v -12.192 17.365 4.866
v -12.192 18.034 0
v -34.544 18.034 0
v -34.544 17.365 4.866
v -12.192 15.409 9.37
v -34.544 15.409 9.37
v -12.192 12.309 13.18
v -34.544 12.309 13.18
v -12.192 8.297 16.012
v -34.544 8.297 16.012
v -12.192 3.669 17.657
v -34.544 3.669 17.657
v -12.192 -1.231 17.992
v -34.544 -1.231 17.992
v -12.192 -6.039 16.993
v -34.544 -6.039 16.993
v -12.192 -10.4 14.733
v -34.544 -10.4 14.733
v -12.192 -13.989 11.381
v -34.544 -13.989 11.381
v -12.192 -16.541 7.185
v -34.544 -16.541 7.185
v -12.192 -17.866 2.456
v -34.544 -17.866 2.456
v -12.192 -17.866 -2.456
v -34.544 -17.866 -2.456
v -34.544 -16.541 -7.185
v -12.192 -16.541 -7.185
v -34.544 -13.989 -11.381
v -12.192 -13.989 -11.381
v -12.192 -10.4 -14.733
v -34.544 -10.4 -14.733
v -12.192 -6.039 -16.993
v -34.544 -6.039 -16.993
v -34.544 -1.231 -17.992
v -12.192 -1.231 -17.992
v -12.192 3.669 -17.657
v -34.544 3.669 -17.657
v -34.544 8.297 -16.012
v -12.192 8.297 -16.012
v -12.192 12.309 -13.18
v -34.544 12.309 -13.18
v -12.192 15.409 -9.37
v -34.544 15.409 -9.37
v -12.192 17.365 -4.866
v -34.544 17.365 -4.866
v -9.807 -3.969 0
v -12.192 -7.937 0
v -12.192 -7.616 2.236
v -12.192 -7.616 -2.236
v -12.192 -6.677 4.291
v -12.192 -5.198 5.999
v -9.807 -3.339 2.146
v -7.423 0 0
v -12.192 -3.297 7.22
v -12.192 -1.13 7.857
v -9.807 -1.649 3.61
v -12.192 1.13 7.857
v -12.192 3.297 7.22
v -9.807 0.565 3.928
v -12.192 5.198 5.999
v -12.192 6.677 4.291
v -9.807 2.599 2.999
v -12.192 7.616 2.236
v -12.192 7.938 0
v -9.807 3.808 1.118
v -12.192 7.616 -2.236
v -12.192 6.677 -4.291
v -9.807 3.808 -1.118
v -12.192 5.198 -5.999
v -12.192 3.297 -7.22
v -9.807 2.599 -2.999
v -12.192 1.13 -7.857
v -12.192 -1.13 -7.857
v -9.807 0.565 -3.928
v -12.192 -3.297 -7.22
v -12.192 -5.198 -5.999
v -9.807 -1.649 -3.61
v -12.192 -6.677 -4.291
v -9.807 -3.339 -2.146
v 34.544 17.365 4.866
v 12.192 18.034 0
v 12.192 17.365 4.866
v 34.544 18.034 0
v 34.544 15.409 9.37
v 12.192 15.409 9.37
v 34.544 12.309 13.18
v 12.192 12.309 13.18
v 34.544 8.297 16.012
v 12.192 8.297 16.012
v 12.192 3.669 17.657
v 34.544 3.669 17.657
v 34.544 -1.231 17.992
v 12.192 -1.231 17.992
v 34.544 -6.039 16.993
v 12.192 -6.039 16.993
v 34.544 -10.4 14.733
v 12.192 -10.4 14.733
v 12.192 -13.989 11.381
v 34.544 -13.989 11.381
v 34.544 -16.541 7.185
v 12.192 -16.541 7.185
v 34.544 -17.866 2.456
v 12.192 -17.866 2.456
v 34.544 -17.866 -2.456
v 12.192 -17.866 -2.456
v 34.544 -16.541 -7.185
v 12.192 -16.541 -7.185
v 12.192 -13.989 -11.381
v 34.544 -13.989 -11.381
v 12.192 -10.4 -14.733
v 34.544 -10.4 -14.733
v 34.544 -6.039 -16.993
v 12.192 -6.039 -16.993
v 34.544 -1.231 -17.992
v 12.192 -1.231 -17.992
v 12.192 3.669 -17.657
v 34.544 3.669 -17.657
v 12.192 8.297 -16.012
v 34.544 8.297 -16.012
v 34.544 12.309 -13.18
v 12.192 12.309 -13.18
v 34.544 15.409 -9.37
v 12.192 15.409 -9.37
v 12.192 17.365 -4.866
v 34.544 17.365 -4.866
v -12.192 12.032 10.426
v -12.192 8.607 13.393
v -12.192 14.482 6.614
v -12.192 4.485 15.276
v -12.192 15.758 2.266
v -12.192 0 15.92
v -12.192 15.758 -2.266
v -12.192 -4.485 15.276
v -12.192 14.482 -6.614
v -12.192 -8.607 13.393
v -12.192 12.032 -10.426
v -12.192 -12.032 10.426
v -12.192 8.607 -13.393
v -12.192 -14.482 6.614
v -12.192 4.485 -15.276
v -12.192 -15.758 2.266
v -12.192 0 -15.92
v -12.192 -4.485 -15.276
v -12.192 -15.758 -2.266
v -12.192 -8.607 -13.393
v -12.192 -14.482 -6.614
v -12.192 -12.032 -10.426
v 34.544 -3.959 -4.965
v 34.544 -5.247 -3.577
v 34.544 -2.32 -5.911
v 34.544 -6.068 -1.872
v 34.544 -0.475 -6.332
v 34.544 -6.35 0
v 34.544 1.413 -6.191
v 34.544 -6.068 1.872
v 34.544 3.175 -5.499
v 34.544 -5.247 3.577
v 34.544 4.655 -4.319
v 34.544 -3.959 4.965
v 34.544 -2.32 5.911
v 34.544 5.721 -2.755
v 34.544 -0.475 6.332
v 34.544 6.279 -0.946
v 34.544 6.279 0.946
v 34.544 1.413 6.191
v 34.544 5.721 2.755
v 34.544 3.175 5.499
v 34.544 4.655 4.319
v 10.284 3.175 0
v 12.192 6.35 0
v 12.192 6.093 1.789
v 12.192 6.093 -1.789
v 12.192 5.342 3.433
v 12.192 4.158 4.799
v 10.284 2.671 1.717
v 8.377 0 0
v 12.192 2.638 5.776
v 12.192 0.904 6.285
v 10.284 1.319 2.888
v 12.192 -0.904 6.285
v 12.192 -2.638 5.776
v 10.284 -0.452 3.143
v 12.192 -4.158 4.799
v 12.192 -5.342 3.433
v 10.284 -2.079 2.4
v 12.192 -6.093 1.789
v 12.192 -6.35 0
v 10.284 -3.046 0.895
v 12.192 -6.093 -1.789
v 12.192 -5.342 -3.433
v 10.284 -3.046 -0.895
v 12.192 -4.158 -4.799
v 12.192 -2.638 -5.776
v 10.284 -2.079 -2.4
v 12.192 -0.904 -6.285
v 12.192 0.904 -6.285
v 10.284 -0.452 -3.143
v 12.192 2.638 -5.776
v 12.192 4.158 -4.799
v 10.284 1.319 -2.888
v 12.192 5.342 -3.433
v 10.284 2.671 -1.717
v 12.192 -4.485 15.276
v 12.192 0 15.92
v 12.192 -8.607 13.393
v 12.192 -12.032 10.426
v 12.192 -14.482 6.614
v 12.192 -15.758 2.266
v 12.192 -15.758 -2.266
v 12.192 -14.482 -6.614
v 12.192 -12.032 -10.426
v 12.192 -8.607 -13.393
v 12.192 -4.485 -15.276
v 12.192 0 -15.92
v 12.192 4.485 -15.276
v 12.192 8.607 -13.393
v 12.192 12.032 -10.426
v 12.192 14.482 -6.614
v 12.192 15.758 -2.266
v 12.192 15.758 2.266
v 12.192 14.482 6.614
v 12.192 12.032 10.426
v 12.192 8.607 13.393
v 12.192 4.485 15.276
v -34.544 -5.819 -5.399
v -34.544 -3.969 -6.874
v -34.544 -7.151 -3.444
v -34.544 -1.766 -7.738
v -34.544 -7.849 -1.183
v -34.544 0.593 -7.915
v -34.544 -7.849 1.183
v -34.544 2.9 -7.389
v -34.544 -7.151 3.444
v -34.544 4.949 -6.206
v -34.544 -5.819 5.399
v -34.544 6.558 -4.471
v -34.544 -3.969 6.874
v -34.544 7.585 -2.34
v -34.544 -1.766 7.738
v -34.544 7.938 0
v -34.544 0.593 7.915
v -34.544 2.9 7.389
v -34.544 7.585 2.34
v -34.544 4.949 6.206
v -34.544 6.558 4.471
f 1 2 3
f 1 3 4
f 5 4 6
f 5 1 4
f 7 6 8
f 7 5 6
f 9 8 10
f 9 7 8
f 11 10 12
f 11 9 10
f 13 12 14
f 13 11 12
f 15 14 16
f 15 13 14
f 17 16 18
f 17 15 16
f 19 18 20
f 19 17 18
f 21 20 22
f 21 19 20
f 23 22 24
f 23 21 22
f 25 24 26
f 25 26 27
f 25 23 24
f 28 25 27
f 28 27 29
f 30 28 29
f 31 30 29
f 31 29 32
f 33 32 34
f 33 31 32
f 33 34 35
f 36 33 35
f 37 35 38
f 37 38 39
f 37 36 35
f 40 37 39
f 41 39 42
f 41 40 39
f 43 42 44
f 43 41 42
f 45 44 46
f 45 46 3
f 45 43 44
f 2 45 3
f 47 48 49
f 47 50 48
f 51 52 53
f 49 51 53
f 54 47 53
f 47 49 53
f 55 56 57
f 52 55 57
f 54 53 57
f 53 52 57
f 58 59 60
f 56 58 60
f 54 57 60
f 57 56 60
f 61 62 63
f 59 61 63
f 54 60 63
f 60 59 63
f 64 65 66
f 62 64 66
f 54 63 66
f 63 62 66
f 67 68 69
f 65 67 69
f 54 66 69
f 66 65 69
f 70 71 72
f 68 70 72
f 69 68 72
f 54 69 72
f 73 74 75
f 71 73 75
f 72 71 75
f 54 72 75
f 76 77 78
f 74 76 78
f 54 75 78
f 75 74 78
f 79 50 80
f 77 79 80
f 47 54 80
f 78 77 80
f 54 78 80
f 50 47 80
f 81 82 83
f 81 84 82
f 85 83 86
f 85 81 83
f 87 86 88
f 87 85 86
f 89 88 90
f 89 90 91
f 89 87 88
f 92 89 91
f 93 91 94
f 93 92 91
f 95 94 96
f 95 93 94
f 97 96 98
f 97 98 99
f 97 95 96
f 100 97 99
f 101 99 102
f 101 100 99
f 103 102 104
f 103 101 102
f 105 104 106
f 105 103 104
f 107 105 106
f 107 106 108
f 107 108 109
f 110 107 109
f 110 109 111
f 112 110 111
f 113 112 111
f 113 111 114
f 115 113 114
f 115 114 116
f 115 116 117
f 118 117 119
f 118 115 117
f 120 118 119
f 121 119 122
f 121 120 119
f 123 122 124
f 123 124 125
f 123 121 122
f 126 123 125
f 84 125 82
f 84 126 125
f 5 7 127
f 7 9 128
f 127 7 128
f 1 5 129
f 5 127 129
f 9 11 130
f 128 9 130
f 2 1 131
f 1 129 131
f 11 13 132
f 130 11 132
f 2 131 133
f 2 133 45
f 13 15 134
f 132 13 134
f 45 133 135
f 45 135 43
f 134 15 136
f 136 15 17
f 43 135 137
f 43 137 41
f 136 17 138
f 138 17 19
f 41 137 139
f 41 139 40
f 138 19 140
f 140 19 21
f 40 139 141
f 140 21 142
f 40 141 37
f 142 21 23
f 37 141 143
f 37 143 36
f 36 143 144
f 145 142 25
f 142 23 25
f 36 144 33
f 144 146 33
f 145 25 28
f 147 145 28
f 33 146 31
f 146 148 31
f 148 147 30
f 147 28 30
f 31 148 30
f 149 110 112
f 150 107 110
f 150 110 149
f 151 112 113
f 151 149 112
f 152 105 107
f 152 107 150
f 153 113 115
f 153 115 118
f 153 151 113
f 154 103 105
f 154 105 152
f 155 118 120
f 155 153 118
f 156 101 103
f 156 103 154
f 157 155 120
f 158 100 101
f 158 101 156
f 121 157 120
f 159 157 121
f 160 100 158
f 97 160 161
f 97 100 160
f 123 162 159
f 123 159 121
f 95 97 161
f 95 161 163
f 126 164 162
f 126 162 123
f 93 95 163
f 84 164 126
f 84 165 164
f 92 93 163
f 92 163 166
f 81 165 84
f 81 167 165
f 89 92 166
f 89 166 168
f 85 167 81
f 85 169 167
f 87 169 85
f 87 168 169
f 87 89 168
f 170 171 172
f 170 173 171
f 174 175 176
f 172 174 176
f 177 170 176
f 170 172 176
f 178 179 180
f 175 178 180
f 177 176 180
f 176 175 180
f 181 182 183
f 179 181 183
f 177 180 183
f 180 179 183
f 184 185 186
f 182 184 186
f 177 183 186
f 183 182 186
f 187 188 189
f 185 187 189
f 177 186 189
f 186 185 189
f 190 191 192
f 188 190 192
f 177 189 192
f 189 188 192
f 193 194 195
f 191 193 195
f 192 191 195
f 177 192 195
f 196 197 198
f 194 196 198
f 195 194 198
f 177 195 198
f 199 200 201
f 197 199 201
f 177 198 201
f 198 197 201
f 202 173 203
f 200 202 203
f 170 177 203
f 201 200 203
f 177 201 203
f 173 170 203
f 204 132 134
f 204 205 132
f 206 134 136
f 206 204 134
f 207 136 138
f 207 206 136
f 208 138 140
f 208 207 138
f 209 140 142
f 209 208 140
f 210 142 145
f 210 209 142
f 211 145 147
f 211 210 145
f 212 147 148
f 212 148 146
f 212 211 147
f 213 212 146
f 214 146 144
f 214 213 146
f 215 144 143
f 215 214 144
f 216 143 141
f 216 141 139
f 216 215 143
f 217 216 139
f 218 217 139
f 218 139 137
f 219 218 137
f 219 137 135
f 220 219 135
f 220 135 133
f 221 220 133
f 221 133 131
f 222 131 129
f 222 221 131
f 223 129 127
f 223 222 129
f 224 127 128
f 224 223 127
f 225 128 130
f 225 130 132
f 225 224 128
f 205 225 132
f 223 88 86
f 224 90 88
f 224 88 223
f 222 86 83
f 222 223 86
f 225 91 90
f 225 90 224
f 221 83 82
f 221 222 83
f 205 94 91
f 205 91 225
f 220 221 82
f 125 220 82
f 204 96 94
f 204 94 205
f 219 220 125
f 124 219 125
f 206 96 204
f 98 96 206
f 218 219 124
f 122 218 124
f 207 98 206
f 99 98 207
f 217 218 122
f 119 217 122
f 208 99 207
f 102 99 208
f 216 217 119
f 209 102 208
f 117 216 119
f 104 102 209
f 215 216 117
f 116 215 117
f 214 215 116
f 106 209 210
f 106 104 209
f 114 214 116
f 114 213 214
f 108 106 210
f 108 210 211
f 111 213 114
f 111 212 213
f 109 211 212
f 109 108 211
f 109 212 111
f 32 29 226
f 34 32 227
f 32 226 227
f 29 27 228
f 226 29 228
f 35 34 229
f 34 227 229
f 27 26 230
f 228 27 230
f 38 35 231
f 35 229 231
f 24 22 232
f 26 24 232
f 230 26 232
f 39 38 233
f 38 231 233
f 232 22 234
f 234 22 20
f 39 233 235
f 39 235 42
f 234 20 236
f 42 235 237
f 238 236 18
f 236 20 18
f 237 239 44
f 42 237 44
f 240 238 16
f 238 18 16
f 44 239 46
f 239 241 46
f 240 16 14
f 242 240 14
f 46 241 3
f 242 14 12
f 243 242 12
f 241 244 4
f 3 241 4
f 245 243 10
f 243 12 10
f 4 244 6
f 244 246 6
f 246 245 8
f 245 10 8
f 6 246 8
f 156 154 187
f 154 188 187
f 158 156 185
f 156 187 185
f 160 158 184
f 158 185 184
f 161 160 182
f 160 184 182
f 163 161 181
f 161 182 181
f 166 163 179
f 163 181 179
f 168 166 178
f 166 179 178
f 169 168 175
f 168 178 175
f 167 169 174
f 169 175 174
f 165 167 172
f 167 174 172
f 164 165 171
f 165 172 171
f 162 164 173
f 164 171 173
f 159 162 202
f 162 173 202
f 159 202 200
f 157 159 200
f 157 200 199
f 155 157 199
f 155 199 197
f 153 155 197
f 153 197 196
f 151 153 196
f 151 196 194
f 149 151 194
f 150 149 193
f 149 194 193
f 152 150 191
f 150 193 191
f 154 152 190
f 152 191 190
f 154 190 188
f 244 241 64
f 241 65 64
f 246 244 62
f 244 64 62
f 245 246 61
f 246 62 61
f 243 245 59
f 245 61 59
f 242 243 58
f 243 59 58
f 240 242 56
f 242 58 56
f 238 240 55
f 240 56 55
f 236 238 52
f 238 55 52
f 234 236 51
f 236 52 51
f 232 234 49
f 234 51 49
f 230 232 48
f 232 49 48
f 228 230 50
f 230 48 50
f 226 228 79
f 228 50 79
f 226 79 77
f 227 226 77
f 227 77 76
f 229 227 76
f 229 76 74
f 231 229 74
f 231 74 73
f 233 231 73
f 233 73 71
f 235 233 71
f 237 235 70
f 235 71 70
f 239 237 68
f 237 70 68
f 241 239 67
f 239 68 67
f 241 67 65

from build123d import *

# Parameters (mm, degrees)
F0_R     = 18.034
F1_DEPTH = 34.544
F2_W     = 24.384
F2_H     = 2.286
F5_D     = 12.7
F5_DEPTH = 22.352
F5_TIP   = 3.8154649308
F7_D     = 15.875
F7_DEPTH = 22.352
F7_TIP   = 4.7693311635


# Not quite as in the source:
# - a length typed as a fraction of an inch, garbled in the dataset ("3 / 203.2 mm" for 3/8 in), is restored


with BuildPart() as f1:
    # F0 (on Right) → F1 (new body, symmetric)
    with BuildSketch(Plane.YZ):
        Circle(F0_R)
    extrude(amount=F1_DEPTH, both=True)

    # F2 (on Front) → F3 (revolve, cut)
    with BuildSketch(Plane.XZ):
        with Locations((0, 17.0634527736)):
            Rectangle(F2_W, F2_H)
    revolve(axis=Axis((6.0458816588, 0, 0), (1, 0, 0)), mode=Mode.SUBTRACT)

    # F5
    with Locations(Plane.YZ.offset(34.544)):
        with Locations((0, 0)):
            Hole(F5_D / 2, depth=F5_DEPTH)
            with Locations((0, 0, -(F5_DEPTH + F5_TIP / 2))):  # 118° drill point
                Cone(0, F5_D / 2, F5_TIP, mode=Mode.SUBTRACT)

    # F7
    with Locations(Plane(origin=(-34.544, 0, 0), x_dir=(0, -1, 0), z_dir=(-1, 0, 0))):
        with Locations((0, 0)):
            Hole(F7_D / 2, depth=F7_DEPTH)
            with Locations((0, 0, -(F7_DEPTH + F7_TIP / 2))):  # 118° drill point
                Cone(0, F7_D / 2, F7_TIP, mode=Mode.SUBTRACT)


solid = f1.part
